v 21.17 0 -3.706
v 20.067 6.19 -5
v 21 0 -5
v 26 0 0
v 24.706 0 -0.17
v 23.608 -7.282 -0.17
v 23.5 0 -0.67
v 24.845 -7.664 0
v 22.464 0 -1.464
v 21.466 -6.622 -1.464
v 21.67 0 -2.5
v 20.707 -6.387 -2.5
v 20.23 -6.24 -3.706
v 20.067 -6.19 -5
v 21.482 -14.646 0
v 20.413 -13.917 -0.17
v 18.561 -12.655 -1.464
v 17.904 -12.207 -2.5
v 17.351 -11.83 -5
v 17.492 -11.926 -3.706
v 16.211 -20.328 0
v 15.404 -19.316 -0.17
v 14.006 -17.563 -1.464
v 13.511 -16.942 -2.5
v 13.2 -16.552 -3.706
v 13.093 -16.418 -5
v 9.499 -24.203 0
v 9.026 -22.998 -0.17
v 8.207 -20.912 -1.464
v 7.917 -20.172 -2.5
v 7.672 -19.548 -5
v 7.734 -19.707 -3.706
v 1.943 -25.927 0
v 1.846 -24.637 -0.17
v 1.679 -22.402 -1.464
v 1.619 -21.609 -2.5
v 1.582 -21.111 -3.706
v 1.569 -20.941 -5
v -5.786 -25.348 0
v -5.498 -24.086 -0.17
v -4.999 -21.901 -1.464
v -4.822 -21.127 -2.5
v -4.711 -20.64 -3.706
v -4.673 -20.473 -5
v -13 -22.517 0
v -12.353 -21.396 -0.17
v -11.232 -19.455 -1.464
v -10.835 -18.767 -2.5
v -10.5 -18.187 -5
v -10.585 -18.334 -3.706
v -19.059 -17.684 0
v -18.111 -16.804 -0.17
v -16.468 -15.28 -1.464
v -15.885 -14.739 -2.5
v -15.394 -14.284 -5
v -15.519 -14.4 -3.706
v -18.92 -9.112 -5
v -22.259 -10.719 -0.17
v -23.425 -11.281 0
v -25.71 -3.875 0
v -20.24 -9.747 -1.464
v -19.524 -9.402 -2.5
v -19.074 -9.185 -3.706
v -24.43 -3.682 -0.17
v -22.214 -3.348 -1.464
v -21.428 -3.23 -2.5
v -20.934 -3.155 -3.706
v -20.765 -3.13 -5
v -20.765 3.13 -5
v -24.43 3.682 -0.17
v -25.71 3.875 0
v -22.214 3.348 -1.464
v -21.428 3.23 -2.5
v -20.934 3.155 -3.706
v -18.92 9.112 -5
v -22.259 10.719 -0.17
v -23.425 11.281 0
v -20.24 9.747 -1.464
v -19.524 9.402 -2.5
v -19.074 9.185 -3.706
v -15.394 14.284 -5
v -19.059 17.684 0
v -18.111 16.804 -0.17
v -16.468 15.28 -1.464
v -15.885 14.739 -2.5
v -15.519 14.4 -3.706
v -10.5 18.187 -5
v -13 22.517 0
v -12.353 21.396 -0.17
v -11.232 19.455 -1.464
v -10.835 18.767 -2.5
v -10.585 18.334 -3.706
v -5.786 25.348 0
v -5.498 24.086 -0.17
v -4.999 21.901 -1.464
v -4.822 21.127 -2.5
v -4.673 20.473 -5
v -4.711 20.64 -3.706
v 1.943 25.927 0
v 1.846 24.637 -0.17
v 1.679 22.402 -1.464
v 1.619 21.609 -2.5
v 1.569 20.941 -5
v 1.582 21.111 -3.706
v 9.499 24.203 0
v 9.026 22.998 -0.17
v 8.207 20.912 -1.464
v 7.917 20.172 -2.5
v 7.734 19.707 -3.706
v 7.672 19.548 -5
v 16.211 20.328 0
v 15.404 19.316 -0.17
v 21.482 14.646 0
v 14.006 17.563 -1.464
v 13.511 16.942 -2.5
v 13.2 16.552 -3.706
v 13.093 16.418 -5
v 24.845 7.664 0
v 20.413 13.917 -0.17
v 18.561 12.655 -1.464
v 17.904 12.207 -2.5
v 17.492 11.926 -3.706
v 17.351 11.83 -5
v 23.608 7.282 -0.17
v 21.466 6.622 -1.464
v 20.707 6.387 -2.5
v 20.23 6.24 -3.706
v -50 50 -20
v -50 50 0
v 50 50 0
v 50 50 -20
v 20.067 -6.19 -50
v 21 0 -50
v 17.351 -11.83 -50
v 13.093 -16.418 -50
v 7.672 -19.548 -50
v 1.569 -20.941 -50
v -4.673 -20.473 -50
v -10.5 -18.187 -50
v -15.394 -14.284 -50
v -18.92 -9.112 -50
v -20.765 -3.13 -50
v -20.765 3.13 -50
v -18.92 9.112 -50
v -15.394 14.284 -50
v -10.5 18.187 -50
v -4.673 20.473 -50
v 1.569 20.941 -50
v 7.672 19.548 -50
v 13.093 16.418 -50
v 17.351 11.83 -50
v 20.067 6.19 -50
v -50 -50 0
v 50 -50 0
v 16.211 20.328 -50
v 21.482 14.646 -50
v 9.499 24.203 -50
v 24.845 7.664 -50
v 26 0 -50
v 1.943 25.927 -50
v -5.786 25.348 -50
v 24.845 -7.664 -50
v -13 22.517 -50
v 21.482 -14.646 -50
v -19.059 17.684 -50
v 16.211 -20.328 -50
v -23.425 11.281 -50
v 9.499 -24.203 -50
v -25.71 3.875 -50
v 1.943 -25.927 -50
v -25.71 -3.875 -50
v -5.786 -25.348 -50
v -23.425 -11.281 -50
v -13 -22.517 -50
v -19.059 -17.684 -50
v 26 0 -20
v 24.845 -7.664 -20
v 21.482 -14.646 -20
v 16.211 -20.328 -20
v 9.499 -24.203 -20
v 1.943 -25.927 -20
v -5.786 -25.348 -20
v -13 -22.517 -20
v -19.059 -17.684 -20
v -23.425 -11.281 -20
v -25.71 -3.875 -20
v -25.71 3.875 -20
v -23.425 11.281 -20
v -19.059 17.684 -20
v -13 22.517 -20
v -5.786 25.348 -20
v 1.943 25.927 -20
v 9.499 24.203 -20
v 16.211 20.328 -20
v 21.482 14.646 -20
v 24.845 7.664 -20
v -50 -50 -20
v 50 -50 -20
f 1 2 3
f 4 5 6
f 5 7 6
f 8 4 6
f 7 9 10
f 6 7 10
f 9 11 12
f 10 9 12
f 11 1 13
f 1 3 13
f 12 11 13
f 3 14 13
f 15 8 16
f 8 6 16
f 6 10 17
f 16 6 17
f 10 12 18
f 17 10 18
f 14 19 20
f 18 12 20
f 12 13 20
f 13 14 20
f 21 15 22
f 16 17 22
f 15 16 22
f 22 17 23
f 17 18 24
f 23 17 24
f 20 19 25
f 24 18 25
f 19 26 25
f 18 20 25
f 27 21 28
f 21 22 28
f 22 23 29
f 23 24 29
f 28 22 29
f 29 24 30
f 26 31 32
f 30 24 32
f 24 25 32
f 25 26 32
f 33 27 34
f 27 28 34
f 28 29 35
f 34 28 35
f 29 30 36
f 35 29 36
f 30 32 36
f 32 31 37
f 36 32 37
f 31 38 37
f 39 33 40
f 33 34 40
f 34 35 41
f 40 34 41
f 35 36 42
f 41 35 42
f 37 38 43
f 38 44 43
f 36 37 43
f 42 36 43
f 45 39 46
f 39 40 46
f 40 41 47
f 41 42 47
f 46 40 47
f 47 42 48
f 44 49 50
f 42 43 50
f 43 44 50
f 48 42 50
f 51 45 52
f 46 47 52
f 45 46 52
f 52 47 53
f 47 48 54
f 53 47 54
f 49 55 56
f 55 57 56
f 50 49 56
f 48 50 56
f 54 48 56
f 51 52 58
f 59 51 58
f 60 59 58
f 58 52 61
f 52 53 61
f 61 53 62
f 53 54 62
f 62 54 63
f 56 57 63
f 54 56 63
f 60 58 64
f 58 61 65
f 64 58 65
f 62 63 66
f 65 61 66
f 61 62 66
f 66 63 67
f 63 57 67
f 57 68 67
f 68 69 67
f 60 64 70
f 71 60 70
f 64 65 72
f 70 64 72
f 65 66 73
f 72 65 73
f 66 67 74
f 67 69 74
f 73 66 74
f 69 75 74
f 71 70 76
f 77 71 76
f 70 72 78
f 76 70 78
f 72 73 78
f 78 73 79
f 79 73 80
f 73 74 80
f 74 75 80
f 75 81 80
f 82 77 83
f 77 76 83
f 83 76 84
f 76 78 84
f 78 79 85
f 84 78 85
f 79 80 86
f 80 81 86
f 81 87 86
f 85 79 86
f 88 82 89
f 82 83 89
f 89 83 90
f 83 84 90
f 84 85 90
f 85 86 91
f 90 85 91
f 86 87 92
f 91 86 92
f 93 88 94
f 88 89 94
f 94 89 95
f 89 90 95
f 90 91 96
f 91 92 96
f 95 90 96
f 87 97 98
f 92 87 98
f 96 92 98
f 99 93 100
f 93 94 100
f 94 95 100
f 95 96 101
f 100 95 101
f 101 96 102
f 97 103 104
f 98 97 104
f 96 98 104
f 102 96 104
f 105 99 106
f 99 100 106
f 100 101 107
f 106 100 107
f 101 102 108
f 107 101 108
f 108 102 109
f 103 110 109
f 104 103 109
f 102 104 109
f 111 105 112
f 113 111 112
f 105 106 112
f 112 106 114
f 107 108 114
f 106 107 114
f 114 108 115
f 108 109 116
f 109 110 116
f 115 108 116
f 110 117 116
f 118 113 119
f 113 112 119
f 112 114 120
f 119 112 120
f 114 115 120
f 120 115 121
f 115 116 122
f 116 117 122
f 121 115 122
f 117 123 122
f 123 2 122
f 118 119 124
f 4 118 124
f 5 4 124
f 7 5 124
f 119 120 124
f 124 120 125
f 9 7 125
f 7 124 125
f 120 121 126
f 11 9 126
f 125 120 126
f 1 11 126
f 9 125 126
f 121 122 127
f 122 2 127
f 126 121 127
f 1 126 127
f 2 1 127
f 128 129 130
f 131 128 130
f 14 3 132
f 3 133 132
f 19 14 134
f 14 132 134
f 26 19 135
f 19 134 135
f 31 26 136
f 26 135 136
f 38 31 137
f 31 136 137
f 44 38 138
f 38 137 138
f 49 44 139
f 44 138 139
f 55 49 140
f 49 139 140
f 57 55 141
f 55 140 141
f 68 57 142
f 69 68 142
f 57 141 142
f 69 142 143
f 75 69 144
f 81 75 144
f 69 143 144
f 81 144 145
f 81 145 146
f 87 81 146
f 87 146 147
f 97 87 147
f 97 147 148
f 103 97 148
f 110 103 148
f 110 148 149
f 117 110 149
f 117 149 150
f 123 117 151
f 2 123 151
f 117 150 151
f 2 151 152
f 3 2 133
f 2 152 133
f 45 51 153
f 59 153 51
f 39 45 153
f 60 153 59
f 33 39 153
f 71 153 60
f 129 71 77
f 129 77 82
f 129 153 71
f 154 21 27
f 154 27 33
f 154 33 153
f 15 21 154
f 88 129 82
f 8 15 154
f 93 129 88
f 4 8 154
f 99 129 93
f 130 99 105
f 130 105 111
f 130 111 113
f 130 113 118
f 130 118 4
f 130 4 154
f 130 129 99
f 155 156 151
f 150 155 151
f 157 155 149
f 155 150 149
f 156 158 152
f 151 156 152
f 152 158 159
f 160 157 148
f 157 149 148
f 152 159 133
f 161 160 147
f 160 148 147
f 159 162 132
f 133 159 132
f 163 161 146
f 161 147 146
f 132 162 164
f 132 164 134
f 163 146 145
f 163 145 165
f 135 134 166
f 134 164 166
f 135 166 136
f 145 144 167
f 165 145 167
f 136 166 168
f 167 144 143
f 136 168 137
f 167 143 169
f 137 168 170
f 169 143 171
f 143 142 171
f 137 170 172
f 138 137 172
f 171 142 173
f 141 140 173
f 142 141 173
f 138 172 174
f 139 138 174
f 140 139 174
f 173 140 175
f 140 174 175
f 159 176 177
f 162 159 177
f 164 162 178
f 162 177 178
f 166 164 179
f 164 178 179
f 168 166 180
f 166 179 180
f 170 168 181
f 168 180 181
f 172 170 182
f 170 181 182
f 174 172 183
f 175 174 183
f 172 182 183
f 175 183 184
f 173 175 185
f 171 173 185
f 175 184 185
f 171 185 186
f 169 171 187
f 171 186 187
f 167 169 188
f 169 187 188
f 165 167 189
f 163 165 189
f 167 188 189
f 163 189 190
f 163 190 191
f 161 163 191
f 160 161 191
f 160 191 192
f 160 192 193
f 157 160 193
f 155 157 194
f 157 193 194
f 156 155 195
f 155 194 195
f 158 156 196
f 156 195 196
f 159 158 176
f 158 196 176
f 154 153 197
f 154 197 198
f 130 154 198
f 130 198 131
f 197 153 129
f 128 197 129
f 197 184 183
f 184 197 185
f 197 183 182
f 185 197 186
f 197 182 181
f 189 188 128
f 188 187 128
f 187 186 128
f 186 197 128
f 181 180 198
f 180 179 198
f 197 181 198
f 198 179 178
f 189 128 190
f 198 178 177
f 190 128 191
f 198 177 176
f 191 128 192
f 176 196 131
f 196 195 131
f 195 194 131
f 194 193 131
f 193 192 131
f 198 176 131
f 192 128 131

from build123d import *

# Parameters (mm, degrees)
F2_W     = 100
F2_H     = 100
F2_R     = 41
F2_R_2   = 26
F3_DEPTH = 20


with BuildPart() as f1:
    # F0 (on Front) → F1 (revolve)
    with BuildSketch(Plane.XZ):
        with BuildLine():
            Line((41, -5), (41, 0))
            Line((41, 0), (26, 0))
            ThreePointArc((26, 0), (22.464466, -1.464466), (21, -5))
            Line((21, -5), (21, -50))
            Line((21, -50), (26, -50))
            Line((26, -50), (26, -10))
            ThreePointArc((26, -10), (27.464466, -6.464466), (31, -5))
            Line((31, -5), (41, -5))
        make_face()
    revolve(axis=Axis((0, 0, -25.033533), (0, 0, -1)))

    # F2 (on face) → F3 (join)
    with BuildSketch(Plane.XY):
        Rectangle(F2_W, F2_H)
        Circle(F2_R, mode=Mode.SUBTRACT)
        Circle(F2_R)
        Circle(F2_R_2, mode=Mode.SUBTRACT)
    extrude(amount=-F3_DEPTH)


solid = f1.part
